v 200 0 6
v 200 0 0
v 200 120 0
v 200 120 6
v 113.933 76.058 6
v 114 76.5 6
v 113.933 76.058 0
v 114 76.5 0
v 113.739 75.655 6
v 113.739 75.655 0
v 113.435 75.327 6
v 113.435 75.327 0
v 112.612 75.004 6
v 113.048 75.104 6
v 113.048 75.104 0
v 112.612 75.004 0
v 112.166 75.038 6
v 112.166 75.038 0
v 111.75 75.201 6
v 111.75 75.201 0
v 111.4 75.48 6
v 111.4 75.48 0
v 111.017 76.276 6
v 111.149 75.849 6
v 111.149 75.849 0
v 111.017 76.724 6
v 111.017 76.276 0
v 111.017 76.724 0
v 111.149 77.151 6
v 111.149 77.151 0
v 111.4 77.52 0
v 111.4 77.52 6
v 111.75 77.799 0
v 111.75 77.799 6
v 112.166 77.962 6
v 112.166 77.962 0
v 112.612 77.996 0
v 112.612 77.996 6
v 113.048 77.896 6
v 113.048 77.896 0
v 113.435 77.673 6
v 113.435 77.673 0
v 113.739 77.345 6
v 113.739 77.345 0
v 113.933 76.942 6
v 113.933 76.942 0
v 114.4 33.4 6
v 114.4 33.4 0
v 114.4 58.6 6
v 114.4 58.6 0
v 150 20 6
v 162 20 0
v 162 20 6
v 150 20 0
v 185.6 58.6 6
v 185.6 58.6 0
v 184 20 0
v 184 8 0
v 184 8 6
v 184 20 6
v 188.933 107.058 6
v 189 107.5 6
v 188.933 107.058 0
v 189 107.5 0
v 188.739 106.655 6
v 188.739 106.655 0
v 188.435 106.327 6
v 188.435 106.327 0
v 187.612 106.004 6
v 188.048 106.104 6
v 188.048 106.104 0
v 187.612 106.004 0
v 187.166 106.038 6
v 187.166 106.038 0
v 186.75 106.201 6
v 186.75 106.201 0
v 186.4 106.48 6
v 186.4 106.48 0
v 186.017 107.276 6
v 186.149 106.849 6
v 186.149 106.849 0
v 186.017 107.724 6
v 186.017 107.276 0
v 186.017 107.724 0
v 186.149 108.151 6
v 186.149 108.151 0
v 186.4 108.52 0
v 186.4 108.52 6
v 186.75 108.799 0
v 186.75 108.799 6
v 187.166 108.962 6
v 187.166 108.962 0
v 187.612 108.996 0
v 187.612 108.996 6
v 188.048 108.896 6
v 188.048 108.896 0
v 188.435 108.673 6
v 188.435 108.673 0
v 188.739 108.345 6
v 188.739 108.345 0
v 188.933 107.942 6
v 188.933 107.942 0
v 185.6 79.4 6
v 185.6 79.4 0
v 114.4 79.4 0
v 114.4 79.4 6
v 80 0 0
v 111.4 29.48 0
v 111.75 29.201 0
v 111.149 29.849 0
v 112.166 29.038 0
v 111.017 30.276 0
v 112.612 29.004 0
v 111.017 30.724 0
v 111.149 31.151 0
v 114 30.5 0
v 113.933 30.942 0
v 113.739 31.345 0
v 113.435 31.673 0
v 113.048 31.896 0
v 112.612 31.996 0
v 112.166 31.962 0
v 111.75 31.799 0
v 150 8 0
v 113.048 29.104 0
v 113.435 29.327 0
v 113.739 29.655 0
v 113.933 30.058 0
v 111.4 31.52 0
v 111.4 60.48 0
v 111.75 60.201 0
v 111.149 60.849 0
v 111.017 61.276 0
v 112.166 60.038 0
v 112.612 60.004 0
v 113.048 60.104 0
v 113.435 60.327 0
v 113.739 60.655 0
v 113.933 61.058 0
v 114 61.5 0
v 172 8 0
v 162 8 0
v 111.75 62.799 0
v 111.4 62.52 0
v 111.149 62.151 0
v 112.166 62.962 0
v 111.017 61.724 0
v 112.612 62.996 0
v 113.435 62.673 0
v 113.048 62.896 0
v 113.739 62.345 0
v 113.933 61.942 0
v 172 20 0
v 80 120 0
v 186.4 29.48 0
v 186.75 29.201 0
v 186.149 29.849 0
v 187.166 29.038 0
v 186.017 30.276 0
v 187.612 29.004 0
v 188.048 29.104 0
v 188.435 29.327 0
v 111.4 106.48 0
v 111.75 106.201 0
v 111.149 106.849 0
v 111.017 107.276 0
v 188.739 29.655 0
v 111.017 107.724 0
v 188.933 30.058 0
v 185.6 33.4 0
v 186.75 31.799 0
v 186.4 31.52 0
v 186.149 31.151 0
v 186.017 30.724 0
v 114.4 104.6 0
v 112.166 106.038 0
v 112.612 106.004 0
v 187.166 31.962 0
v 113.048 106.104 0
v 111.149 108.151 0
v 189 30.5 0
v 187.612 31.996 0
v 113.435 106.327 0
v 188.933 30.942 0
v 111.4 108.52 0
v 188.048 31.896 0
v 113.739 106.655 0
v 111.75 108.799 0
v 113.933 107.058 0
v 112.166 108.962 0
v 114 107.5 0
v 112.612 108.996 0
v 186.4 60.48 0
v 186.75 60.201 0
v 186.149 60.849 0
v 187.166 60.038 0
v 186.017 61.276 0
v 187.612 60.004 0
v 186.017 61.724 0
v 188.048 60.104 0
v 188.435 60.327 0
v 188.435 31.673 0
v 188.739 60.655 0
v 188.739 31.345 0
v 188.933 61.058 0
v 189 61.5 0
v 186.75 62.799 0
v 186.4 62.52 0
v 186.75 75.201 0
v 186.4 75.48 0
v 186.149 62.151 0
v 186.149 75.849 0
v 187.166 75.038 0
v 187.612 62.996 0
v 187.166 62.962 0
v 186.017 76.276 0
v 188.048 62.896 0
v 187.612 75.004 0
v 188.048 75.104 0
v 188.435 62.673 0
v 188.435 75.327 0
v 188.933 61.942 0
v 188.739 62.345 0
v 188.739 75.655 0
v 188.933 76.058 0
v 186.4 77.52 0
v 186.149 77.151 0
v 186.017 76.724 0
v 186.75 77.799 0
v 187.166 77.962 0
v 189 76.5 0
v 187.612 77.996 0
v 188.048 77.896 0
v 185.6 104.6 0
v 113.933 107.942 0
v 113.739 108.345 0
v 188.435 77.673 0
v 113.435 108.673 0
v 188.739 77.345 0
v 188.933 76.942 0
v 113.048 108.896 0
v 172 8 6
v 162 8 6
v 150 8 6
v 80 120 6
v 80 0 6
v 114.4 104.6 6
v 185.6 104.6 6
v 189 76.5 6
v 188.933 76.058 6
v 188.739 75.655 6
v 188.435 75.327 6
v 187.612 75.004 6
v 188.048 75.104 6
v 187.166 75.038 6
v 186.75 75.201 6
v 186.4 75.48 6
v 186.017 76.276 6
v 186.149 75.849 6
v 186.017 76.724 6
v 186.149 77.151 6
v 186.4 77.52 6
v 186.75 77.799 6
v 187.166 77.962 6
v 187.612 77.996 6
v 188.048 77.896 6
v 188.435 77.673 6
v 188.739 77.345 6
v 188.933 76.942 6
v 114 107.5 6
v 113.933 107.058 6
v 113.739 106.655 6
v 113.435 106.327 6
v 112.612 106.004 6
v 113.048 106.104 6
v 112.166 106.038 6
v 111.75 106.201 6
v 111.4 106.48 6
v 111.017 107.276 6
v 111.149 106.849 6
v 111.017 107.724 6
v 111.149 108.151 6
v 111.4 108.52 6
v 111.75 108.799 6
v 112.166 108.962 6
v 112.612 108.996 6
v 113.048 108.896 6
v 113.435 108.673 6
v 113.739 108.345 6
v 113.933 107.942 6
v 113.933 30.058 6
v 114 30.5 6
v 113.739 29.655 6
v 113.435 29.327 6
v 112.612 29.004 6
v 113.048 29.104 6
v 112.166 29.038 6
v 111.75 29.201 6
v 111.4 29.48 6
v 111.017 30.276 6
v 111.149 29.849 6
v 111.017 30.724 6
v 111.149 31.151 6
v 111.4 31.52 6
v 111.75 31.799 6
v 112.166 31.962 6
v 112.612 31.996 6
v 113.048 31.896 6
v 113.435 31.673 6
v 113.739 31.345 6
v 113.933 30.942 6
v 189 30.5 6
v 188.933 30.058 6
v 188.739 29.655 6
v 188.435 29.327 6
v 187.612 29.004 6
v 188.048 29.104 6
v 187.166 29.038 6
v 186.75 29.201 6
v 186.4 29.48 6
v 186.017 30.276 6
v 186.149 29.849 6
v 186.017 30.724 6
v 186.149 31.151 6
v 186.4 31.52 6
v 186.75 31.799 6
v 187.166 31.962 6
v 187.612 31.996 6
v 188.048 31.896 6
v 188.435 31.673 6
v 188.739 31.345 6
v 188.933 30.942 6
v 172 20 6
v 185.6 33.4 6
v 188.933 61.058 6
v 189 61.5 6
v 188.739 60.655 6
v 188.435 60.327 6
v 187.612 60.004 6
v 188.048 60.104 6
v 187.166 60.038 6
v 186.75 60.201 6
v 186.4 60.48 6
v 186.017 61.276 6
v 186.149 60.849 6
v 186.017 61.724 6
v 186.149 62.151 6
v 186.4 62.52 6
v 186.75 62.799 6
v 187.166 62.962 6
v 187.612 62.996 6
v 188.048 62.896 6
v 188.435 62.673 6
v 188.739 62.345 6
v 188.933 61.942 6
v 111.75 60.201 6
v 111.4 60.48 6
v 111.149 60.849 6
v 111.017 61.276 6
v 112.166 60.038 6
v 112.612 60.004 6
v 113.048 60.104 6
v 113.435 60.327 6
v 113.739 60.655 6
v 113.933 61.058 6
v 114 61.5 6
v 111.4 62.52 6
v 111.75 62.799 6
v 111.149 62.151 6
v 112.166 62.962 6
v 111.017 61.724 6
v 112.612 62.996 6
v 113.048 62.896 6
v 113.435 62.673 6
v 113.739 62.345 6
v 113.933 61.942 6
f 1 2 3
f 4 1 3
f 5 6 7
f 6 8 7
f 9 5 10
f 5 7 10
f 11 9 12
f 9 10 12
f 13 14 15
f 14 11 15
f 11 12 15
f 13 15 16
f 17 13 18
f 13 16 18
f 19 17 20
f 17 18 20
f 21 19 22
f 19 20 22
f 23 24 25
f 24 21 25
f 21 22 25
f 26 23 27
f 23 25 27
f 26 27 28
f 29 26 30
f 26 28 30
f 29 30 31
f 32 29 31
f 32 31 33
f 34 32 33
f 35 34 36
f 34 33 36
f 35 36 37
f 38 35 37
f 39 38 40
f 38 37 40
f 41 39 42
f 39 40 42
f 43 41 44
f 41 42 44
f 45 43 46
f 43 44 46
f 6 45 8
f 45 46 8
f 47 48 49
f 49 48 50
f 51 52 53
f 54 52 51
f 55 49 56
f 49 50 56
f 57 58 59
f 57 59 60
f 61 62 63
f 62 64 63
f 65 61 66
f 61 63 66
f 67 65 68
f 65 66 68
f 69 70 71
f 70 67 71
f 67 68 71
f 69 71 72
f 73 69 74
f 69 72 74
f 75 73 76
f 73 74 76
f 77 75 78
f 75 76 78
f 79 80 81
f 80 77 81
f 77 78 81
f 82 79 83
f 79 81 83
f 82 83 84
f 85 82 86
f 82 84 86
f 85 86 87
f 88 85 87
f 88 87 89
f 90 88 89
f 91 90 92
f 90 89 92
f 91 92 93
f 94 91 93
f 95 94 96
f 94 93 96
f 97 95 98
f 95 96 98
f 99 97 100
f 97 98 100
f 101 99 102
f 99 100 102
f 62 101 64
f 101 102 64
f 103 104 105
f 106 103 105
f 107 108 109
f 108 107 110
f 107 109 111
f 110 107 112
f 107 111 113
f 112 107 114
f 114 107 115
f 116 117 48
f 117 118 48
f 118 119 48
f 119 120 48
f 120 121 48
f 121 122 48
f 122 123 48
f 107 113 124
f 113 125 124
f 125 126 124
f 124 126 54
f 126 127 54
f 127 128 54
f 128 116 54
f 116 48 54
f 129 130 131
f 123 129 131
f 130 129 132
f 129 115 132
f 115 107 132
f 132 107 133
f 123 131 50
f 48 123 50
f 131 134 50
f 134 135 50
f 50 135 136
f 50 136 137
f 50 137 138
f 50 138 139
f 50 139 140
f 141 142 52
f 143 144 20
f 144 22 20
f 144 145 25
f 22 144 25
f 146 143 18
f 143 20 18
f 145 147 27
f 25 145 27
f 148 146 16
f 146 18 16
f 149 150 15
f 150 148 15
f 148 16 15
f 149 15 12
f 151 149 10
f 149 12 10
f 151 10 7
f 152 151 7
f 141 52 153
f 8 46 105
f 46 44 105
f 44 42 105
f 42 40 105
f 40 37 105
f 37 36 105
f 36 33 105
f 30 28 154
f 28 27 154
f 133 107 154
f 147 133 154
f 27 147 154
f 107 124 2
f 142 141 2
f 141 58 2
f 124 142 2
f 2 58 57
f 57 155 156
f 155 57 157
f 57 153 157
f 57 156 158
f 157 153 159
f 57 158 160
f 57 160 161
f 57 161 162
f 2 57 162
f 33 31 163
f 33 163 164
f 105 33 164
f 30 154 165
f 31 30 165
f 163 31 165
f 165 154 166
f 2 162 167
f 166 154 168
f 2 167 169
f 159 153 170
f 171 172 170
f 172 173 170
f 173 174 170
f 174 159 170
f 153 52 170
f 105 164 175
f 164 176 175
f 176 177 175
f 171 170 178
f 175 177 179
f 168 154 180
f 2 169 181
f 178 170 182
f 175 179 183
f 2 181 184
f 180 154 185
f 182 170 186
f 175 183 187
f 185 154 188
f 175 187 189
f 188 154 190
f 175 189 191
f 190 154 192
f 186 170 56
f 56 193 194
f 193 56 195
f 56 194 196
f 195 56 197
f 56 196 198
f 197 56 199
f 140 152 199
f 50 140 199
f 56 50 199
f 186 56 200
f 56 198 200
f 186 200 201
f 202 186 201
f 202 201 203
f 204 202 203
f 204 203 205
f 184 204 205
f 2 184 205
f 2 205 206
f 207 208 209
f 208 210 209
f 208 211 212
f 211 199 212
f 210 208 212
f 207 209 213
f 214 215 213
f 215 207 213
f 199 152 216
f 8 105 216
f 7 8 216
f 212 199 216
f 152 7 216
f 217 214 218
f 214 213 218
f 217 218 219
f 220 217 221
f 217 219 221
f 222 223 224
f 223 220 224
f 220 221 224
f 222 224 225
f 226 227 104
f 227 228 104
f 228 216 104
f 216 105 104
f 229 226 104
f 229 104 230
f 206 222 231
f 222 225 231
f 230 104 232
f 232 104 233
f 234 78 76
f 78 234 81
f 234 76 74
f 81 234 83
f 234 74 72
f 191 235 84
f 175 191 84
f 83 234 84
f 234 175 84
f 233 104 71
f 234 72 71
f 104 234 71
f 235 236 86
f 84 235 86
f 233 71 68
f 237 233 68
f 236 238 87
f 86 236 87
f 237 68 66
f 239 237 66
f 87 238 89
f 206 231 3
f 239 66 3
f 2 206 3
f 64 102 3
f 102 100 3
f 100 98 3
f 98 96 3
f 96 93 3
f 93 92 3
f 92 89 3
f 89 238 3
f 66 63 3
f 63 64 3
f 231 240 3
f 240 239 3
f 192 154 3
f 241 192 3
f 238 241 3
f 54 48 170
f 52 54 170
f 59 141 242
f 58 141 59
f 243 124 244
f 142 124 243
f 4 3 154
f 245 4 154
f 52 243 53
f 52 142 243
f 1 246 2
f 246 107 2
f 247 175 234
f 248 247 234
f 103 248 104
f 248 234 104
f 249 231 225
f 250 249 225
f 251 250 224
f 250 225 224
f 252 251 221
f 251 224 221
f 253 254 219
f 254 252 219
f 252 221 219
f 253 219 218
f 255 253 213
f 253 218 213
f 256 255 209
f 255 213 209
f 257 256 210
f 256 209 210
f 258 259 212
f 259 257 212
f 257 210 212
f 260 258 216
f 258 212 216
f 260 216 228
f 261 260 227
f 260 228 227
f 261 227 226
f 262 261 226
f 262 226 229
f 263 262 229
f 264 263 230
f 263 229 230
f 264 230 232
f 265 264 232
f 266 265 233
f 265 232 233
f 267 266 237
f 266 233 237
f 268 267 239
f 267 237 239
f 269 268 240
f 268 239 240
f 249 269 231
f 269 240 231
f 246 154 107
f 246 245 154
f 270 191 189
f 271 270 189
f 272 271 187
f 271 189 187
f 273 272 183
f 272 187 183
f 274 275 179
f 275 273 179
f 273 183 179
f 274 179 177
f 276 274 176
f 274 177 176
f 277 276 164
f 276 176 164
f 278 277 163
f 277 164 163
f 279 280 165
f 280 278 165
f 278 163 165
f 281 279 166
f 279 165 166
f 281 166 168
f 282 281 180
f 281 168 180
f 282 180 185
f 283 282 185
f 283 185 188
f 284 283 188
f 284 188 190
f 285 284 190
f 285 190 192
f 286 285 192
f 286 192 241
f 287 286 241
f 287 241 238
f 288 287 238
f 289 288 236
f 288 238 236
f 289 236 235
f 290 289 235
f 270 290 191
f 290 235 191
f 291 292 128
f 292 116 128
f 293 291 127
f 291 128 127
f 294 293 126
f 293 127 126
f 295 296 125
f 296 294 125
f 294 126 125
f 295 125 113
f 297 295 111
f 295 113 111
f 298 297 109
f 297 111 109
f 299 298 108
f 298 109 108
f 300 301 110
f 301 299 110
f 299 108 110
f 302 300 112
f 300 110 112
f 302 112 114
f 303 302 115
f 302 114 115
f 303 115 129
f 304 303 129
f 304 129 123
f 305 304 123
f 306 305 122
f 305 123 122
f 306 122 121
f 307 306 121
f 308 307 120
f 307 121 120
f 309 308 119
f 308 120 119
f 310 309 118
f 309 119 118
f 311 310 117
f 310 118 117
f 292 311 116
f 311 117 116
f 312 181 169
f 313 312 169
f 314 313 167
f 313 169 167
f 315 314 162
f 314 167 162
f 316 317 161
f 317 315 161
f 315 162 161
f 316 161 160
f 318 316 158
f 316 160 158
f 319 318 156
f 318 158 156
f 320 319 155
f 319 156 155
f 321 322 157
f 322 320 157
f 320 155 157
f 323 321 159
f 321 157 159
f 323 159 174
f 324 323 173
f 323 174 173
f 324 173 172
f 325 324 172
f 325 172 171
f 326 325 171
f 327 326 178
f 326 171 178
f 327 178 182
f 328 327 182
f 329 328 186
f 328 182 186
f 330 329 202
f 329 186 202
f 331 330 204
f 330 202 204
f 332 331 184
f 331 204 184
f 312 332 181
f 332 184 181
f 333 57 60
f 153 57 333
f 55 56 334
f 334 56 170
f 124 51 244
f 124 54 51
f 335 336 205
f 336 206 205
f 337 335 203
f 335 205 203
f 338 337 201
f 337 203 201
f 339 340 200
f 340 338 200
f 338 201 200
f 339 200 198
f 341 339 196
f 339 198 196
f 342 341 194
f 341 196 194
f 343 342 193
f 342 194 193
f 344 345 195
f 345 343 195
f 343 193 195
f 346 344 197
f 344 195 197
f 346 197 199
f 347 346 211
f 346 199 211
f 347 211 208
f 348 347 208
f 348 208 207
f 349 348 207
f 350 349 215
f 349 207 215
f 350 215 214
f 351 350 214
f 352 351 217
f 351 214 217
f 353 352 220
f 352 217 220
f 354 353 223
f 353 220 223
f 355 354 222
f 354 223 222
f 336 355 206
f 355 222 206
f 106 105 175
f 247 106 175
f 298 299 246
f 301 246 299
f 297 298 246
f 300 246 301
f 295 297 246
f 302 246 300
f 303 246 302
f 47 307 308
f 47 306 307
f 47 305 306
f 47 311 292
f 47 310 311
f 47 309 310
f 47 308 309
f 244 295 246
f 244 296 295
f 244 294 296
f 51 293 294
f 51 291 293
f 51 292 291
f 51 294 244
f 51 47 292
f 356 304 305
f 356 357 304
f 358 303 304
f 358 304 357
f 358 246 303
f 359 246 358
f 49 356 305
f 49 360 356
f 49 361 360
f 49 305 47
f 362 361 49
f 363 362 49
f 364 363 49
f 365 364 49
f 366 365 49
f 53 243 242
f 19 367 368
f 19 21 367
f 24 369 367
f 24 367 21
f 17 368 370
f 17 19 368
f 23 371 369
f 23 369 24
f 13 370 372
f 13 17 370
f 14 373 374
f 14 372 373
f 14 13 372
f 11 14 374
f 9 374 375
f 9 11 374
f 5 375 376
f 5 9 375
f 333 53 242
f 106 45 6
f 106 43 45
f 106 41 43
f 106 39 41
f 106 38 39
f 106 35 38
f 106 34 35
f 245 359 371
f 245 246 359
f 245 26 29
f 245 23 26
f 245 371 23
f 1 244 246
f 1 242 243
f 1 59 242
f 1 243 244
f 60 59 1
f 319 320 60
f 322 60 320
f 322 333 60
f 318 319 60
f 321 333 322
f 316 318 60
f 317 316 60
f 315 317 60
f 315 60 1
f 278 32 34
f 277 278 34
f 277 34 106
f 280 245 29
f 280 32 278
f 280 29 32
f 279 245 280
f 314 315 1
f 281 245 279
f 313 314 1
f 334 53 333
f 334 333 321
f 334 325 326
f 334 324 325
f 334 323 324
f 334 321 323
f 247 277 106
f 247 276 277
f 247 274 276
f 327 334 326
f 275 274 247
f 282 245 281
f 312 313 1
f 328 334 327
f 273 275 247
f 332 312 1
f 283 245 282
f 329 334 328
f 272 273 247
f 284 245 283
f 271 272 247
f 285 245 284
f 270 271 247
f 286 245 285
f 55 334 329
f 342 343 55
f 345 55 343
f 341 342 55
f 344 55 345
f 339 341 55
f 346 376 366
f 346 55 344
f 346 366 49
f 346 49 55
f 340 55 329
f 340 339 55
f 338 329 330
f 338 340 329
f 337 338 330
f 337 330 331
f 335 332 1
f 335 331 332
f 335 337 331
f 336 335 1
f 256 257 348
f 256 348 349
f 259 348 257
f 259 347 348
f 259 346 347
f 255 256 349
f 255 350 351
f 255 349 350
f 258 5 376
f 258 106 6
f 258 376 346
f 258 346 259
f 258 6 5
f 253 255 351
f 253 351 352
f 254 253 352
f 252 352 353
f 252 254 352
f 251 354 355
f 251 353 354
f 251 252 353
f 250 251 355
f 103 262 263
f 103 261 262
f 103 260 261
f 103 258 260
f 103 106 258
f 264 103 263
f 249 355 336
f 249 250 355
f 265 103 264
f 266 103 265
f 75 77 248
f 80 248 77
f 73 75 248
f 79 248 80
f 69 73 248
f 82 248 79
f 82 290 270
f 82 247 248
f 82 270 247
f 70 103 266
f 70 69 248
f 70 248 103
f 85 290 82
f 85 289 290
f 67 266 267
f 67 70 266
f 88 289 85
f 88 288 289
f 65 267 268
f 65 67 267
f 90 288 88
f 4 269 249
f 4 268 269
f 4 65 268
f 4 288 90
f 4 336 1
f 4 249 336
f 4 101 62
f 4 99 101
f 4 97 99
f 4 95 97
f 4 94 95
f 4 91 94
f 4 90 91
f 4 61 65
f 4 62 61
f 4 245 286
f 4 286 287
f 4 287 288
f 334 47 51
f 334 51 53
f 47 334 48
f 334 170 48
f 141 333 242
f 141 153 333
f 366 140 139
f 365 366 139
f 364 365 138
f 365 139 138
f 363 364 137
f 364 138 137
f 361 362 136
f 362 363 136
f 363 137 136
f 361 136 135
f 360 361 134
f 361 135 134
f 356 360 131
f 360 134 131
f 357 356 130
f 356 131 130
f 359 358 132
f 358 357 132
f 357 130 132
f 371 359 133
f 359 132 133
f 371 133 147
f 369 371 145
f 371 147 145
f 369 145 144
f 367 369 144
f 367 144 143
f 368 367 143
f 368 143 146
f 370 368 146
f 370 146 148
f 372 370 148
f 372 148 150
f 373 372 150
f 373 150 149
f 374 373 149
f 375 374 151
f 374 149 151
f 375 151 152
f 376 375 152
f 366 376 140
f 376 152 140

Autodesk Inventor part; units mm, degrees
ref_plane "YZ Plane" through (0, 0, 0) normal (1, 0, 0) x (0, 1, 0)
ref_plane "XZ Plane" through (0, 0, 0) normal (0, 1, 0) x (-1, 0, 0)
ref_plane "XY Plane" through (0, 0, 0) normal (0, 0, 1) x (1, 0, 0)
sketch "Sketch1" plane through (0, 0, 0) normal (0, 0, 1) x (1, 0, 0)
  line L0 (0, 0) -> (200, 0)
  line L1 (200, 0) -> (200, 120)
  line L2 (200, 120) -> (0, 120)
  line L3 (0, 120) -> (0, 0)
  line L4 (110, 110) -> (190, 110) construction
  line L5 (190, 110) -> (190, 74) construction
  line L6 (190, 74) -> (110, 74) construction
  line L7 (110, 74) -> (110, 110) construction
  line L8 (110, 64) -> (190, 64) construction
  line L9 (190, 64) -> (190, 28) construction
  line L10 (190, 28) -> (110, 28) construction
  line L11 (110, 28) -> (110, 64) construction
  circle A0 centre (112.5, 107.5) radius 1.5
  circle A1 centre (112.5, 61.5) radius 1.5
  circle A2 centre (187.5, 61.5) radius 1.5
  circle A3 centre (112.5, 30.5) radius 1.5
  circle A4 centre (187.5, 30.5) radius 1.5
  circle A5 centre (187.5, 107.5) radius 1.5
  circle A6 centre (112.5, 76.5) radius 1.5
  circle A7 centre (187.5, 76.5) radius 1.5
  line L12 (114.4, 104.6) -> (185.6, 104.6)
  line L13 (185.6, 104.6) -> (185.6, 79.4)
  line L14 (185.6, 79.4) -> (114.4, 79.4)
  line L15 (114.4, 79.4) -> (114.4, 104.6)
  line L16 (114.4, 58.6) -> (185.6, 58.6)
  line L17 (185.6, 58.6) -> (185.6, 33.4)
  line L18 (185.6, 33.4) -> (114.4, 33.4)
  line L19 (114.4, 33.4) -> (114.4, 58.6)
  dimension "d0" = 200
  dimension "d1" = 120
  dimension "d4" = 80
  dimension "d5" = 36
  dimension "d6" = 80
  dimension "d7" = 36
  dimension "d8" = 110
  dimension "d9" = 110
  dimension "d10" = 10
  dimension "d11" = 10
  dimension "d12" = 3
  dimension "d13" = 2.5
  dimension "d14" = 2.5
  dimension "d15" = 3
  dimension "d16" = 2.5
  dimension "d17" = 2.5
  dimension "d20" = 75
  dimension "d23" = 31
  dimension "d28" = 75
  dimension "d31" = 31
  dimension "d34" = 5.4
  dimension "d35" = 4.4
  dimension "d36" = 4.4
  dimension "d37" = 5.4
  dimension "d38" = 5.4
  dimension "d39" = 4.4
  dimension "d40" = 5.4
  dimension "d41" = 4.4
extrude "Extrusion1" add sketch "Sketch1" along normal blind 6
extrude "Extrusion2" cut sketch "Sketch1" along normal blind 75 contours A0 | A1 | A2 | A3 | A4 | A5 | A6 | A7 | L12 L13 L14 L15 | L16 L17 L18 L19
sketch "Sketch2" plane through (0, 0, 0) normal (0, 0, -1) x (-1, 0, 0)
  line L0 (-150, 8) -> (-162, 8)
  line L1 (-162, 8) -> (-162, 20)
  line L2 (-162, 20) -> (-150, 20)
  line L3 (-150, 20) -> (-150, 8)
  line L4 (-172, 8) -> (-184, 8)
  line L5 (-184, 8) -> (-184, 20)
  line L6 (-184, 20) -> (-172, 20)
  line L7 (-172, 20) -> (-172, 8)
  line L8 (0, 120) -> (0, 0) projected
  line L9 (-200, 120) -> (0, 120) projected
  point P0 (-150, 14)
  point P1 (-172, 14)
  dimension "d44" = 12
  dimension "d45" = 12
  dimension "d46" = 12
  dimension "d47" = 12
  dimension "d48" = 150
  dimension "d49" = 10
  dimension "d50" = 100
  dimension "d51" = 100
extrude "Extrusion3" cut sketch "Sketch2" against normal blind 6
sketch "Sketch3" plane through (0, 0, 6) normal (0, 0, 1) x (1, 0, 0)
  line L0 (0, 0) -> (200, 0) projected
  line L1 (0, 120) -> (80, 120)
  line L2 (80, 120) -> (80, 0)
  line L3 (80, 0) -> (0, 0)
  line L4 (0, 0) -> (0, 120)
  dimension "d54" = 80
extrude "Extrusion4" cut sketch "Sketch3" against normal blind 10
equation "\"d42\" = d28"
properties part number "lcd holder"
